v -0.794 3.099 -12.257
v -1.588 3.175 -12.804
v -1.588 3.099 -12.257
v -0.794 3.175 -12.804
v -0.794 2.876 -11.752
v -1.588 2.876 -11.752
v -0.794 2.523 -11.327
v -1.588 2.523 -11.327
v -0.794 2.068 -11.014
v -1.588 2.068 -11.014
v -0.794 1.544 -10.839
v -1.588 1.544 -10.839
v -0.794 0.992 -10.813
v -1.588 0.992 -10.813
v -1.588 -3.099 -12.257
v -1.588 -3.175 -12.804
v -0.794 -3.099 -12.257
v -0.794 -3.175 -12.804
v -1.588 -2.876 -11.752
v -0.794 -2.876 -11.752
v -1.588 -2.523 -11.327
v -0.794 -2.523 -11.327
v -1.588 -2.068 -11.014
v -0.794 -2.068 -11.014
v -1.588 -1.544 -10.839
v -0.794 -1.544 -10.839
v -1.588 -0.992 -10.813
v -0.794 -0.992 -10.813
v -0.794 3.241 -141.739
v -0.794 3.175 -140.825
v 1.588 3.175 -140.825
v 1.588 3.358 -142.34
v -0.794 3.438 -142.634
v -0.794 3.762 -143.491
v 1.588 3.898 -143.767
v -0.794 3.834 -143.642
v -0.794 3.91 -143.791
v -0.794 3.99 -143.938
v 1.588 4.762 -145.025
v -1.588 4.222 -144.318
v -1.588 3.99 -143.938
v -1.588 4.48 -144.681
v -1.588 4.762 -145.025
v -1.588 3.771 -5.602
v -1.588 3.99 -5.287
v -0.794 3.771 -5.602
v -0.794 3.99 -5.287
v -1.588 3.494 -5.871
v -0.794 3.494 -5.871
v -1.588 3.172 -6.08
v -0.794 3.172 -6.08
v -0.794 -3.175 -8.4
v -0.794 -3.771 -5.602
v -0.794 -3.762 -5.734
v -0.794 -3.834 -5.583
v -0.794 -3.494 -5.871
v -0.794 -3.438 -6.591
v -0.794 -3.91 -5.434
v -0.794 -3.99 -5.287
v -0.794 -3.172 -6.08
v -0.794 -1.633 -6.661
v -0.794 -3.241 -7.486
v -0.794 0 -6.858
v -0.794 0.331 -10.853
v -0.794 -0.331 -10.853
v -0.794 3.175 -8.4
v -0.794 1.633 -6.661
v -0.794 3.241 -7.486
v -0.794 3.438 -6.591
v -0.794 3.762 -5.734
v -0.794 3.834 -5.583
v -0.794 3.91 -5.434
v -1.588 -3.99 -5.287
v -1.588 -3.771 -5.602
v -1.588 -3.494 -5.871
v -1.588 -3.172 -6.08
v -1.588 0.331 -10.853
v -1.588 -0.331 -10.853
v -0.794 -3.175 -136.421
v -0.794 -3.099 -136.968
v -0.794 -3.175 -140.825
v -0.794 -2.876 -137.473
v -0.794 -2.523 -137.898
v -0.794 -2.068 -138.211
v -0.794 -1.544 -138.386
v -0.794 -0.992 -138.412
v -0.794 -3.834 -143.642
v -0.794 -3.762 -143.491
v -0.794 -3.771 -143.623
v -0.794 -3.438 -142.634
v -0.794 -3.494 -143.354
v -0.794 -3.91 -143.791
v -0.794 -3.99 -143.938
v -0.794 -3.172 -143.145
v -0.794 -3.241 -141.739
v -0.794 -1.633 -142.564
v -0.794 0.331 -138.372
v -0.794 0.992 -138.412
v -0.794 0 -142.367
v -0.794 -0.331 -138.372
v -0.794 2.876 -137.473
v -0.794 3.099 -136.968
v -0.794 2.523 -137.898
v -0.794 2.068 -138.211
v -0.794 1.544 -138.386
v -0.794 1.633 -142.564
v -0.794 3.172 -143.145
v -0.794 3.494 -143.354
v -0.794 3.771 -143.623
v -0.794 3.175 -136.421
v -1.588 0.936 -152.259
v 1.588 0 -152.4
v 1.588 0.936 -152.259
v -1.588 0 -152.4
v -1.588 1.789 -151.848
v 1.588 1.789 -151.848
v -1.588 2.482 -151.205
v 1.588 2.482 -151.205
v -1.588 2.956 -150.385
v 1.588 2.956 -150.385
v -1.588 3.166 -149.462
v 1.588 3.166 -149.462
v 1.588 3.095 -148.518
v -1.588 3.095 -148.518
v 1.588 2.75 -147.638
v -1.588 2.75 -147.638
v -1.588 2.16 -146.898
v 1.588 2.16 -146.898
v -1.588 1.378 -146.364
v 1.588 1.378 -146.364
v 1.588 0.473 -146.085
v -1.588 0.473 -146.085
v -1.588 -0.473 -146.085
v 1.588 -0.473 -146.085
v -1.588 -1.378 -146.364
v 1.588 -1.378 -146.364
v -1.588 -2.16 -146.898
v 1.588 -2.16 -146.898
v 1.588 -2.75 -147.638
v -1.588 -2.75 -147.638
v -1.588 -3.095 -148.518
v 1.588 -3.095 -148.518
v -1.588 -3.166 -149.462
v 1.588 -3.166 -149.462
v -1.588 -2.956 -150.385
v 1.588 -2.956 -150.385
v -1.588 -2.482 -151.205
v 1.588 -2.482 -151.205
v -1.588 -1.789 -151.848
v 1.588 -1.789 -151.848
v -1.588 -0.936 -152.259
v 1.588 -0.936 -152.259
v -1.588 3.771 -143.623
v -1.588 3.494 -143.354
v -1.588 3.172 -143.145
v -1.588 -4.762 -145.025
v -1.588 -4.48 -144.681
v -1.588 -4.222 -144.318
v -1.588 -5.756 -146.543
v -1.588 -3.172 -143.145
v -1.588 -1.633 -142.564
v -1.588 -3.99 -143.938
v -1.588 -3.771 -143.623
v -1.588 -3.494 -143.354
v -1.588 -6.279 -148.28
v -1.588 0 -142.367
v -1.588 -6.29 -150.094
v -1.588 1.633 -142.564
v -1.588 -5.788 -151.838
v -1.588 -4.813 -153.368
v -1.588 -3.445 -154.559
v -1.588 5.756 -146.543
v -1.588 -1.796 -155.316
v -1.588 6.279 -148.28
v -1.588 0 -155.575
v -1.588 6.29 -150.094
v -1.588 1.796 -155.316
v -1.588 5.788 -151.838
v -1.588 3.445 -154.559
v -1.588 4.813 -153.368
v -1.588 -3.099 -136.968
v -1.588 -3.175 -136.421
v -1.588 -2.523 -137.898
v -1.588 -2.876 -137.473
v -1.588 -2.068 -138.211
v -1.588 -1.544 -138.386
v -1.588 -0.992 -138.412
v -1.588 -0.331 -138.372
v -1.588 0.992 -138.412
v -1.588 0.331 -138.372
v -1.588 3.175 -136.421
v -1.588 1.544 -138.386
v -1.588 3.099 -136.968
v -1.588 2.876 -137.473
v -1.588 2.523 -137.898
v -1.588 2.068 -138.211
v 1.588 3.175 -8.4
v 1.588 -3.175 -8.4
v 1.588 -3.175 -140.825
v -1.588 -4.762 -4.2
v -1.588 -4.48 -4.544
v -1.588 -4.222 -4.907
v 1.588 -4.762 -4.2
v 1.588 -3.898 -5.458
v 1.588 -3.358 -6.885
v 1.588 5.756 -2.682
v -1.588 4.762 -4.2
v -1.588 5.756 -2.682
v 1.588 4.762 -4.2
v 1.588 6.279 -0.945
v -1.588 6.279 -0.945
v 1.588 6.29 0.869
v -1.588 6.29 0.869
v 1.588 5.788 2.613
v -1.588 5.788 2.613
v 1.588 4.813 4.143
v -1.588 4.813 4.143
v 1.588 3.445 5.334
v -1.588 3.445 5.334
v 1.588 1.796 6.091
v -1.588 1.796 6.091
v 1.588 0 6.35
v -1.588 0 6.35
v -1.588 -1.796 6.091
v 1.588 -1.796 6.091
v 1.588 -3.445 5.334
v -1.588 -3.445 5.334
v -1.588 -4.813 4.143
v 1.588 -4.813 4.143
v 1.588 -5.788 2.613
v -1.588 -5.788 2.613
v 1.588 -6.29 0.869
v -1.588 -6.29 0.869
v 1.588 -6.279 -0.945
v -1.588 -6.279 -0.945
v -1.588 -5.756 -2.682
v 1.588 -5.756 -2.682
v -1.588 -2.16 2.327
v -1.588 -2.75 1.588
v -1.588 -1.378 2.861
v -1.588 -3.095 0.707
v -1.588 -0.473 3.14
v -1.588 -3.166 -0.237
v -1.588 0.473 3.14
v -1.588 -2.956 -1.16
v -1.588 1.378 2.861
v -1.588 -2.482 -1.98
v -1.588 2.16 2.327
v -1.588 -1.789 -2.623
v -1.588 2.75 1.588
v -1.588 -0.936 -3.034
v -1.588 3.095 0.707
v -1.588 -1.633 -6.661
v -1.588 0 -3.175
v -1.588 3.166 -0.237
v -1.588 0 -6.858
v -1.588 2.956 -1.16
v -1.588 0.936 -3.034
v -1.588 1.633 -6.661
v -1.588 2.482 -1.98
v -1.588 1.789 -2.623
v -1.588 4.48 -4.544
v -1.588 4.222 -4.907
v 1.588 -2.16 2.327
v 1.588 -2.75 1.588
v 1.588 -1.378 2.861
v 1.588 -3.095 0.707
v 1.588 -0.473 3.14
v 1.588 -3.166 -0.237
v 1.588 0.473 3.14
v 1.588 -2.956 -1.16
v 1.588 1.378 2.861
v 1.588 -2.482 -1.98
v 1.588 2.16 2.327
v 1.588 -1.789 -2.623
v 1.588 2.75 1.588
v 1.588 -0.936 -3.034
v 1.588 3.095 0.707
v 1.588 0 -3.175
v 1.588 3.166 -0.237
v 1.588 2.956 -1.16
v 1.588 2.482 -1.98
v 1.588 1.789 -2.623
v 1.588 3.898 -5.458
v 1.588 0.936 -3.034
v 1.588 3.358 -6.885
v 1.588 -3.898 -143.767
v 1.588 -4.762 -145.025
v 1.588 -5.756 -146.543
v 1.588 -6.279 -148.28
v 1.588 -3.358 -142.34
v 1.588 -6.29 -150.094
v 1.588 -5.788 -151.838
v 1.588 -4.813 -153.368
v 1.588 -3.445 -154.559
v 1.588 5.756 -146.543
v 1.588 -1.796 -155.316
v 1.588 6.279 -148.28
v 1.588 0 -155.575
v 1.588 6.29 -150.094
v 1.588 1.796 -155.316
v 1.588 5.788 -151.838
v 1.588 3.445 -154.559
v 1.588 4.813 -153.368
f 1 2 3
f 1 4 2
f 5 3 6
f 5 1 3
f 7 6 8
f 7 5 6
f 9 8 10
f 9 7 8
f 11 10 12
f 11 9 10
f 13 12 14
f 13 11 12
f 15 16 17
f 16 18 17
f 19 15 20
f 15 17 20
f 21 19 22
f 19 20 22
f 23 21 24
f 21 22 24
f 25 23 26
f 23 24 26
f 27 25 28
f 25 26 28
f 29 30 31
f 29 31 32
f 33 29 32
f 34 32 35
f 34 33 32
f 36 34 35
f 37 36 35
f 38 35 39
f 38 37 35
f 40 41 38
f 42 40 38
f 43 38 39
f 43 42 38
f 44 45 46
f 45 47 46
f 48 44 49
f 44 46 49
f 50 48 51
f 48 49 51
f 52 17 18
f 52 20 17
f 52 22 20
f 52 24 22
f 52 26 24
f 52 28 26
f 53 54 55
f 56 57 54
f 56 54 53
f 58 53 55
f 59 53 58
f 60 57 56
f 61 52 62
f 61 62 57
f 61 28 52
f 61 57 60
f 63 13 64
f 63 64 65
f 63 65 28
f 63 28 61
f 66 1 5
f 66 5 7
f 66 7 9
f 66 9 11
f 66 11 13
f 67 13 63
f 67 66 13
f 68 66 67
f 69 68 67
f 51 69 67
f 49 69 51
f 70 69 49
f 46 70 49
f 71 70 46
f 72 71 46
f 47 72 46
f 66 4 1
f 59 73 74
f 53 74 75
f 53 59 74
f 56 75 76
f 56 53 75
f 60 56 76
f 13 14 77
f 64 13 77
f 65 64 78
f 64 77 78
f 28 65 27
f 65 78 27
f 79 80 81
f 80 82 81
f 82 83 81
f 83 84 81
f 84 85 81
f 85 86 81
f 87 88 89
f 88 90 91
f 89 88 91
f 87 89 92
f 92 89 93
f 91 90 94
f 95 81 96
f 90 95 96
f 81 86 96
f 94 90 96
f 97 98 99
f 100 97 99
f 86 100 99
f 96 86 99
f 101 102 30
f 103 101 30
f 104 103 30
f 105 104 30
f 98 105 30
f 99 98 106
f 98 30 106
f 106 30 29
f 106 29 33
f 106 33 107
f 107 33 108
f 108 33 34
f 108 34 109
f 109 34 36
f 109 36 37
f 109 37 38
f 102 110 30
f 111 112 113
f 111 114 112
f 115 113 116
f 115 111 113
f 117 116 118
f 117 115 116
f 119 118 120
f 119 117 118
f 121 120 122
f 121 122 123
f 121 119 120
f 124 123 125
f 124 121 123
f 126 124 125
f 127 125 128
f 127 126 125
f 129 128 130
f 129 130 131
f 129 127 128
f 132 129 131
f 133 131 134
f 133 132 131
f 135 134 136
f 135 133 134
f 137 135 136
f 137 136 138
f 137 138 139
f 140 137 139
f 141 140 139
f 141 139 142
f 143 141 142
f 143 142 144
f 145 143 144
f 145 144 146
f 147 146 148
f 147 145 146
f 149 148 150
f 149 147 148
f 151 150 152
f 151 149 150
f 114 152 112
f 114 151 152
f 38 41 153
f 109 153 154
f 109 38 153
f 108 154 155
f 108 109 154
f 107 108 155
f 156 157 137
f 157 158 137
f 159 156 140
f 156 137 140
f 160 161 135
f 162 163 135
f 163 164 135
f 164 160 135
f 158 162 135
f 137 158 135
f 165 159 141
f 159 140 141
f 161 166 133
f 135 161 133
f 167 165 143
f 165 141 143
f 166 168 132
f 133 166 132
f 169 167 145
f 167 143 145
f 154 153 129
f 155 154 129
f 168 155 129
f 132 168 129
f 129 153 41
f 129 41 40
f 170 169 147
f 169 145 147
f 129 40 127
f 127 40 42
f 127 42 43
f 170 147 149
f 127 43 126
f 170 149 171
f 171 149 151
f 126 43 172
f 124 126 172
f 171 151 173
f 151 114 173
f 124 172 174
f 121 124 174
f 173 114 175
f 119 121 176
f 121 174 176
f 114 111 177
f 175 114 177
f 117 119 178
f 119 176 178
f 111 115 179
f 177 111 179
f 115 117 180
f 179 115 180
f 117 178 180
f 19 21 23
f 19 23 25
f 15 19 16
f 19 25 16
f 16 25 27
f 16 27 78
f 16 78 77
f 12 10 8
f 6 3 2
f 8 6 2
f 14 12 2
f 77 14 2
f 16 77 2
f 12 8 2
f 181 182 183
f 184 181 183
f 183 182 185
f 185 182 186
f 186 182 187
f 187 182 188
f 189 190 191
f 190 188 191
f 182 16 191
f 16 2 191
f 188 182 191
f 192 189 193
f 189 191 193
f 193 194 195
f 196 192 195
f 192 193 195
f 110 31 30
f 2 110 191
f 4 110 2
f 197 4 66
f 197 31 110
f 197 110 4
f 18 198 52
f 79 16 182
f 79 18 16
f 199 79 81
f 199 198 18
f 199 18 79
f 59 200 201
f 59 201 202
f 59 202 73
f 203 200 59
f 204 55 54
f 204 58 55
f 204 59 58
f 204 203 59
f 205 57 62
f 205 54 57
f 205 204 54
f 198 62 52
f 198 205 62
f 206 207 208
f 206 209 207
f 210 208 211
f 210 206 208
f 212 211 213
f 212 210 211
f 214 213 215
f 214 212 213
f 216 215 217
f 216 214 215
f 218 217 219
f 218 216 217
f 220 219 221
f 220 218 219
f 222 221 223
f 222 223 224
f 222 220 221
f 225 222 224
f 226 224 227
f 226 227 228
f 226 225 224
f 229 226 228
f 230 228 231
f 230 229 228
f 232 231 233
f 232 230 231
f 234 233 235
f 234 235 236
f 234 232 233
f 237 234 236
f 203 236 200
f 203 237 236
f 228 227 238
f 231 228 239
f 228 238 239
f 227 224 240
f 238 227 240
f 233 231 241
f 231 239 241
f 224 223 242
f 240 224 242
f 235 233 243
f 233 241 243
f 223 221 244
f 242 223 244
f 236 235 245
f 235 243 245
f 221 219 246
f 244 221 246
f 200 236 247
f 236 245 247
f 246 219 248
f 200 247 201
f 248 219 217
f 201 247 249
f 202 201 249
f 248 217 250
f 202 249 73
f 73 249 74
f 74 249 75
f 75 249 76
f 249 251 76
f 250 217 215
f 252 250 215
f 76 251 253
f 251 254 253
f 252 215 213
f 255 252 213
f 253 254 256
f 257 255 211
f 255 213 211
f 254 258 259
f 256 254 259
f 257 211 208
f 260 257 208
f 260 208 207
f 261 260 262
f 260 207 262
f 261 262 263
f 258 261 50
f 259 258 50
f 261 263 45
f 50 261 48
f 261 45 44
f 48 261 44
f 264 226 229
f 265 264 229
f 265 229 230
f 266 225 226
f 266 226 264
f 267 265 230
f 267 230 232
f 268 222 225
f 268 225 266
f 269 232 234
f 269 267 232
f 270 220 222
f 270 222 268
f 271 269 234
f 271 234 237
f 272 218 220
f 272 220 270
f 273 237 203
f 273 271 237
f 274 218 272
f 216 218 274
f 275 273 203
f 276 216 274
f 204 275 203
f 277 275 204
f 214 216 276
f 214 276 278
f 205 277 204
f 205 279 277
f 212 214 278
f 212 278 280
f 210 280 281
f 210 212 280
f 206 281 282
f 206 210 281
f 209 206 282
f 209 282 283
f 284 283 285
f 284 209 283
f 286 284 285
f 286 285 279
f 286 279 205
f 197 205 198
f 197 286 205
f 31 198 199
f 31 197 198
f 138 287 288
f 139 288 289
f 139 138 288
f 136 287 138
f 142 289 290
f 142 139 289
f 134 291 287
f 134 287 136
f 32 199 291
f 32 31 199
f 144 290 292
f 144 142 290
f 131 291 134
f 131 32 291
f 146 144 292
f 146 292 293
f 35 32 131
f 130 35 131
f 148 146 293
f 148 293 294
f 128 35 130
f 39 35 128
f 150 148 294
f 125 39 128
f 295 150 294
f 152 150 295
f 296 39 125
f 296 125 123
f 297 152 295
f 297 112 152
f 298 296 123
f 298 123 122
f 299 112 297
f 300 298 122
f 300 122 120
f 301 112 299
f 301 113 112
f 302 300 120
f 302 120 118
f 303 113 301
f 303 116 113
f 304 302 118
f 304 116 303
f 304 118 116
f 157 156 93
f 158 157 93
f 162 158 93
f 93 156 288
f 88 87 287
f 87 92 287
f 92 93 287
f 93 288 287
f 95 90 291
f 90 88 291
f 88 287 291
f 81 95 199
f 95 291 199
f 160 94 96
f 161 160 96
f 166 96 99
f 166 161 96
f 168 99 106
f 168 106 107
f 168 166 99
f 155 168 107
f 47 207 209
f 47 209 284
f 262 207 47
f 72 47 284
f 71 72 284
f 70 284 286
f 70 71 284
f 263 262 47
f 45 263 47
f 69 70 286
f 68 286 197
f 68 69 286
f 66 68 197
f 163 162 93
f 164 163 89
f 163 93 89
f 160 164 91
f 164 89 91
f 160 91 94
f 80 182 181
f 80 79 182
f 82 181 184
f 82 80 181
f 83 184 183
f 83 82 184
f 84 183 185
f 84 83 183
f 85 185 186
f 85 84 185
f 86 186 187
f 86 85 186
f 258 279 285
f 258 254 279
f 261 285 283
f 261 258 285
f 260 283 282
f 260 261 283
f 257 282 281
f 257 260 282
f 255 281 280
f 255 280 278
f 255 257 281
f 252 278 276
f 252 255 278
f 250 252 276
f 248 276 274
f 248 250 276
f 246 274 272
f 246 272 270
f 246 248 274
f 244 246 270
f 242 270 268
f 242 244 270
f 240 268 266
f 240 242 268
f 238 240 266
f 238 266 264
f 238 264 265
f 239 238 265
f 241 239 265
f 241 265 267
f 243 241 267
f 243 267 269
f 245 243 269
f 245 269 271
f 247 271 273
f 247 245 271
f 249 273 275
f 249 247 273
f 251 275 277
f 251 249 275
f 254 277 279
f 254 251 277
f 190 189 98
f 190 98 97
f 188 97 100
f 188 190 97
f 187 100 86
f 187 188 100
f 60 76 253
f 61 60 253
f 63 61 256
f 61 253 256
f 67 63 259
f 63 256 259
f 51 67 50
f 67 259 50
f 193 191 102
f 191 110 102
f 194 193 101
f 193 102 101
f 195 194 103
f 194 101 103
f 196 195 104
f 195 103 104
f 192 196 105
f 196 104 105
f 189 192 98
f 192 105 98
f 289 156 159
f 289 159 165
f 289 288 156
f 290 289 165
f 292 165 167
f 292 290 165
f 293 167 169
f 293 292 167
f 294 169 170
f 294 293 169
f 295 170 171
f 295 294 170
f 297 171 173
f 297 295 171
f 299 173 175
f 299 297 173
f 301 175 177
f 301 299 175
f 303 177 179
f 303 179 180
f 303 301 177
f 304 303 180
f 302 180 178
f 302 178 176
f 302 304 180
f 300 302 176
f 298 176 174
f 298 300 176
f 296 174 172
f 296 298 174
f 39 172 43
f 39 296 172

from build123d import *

# Parameters (mm, degrees)
SKETCH1_R           = 3.175
BOSS_EXTRUDE1_DEPTH = 1.5875
FILLET1_R           = 6.35
CUT_EXTRUDE1_DEPTH  = 0.79375
FILLET2_R           = 2


with BuildPart() as part:
    # Sketch1 → Boss-Extrude1 (new body, symmetric)
    with BuildSketch(Plane(origin=(0, 0, 0), x_dir=(0, 0, -1), z_dir=(1, 0, 0))):
        with BuildLine():
            ThreePointArc((5.499261314, 3.175), (-6.35, 0), (5.499261314, -3.175))
            Line((5.499261314, -3.175), (143.725738686, -3.175))
            ThreePointArc((143.725738686, -3.175), (155.575, 0), (143.725738686, 3.175))
            Line((143.725738686, 3.175), (5.499261314, 3.175))
        make_face()
        Circle(SKETCH1_R, mode=Mode.SUBTRACT)
        with Locations((149.225, 0)):
            Circle(SKETCH1_R, mode=Mode.SUBTRACT)
    extrude(amount=BOSS_EXTRUDE1_DEPTH, both=True)

    # Fillet1
    fillet1_edges = [part.edges().sort_by_distance(p)[0] for p in [
        (0, 3.175, -5.499261314),
        (0, 3.175, -143.725738686),
        (0, -3.175, -143.725738686),
        (0, -3.175, -5.499261314),
    ]]
    fillet(fillet1_edges, radius=FILLET1_R)

    # Sketch2 → Cut-Extrude1 (cut)
    with BuildSketch(Plane.ZY.offset(1.5875)):
        with BuildLine():
            Line((-10.383426303, -3.175), (-8.400260413, -3.175))
            ThreePointArc((-8.400260413, -3.175), (-7.035329576, -3.323430536), (-5.734208949, -3.761783052))
            ThreePointArc((-5.734208949, -3.761783052), (-6.858, 0), (-5.734208949, 3.761783052))
            ThreePointArc((-5.734208949, 3.761783052), (-7.035329576, 3.323430536), (-8.400260413, 3.175))
            Line((-8.400260413, 3.175), (-10.383426303, 3.175))
            ThreePointArc((-10.383426303, 3.175), (-10.858000128, 0), (-10.383426303, -3.175))
        make_face()
    cut_extrude1 = extrude(amount=-CUT_EXTRUDE1_DEPTH, mode=Mode.SUBTRACT)

    # Mirror1: Cut-Extrude1 across plane
    add(cut_extrude1.mirror(Plane.XY.offset(-74.6125)), mode=Mode.SUBTRACT)

    # Fillet2
    fillet2_edges = [part.edges().sort_by_distance(p)[0] for p in [
        (-1.190625, -3.175, -10.383426303),
        (-1.190625, 3.175, -10.383426303),
        (-1.190625, 3.761783052, -5.734208949),
        (-1.190625, -3.761783052, -5.734208949),
        (-1.190625, 3.175, -138.841573697),
        (-1.190625, -3.175, -138.841573697),
        (-1.190625, -3.761783052, -143.490791051),
        (-1.190625, 3.761783052, -143.490791051),
    ]]
    fillet(fillet2_edges, radius=FILLET2_R)


solid = part.part
